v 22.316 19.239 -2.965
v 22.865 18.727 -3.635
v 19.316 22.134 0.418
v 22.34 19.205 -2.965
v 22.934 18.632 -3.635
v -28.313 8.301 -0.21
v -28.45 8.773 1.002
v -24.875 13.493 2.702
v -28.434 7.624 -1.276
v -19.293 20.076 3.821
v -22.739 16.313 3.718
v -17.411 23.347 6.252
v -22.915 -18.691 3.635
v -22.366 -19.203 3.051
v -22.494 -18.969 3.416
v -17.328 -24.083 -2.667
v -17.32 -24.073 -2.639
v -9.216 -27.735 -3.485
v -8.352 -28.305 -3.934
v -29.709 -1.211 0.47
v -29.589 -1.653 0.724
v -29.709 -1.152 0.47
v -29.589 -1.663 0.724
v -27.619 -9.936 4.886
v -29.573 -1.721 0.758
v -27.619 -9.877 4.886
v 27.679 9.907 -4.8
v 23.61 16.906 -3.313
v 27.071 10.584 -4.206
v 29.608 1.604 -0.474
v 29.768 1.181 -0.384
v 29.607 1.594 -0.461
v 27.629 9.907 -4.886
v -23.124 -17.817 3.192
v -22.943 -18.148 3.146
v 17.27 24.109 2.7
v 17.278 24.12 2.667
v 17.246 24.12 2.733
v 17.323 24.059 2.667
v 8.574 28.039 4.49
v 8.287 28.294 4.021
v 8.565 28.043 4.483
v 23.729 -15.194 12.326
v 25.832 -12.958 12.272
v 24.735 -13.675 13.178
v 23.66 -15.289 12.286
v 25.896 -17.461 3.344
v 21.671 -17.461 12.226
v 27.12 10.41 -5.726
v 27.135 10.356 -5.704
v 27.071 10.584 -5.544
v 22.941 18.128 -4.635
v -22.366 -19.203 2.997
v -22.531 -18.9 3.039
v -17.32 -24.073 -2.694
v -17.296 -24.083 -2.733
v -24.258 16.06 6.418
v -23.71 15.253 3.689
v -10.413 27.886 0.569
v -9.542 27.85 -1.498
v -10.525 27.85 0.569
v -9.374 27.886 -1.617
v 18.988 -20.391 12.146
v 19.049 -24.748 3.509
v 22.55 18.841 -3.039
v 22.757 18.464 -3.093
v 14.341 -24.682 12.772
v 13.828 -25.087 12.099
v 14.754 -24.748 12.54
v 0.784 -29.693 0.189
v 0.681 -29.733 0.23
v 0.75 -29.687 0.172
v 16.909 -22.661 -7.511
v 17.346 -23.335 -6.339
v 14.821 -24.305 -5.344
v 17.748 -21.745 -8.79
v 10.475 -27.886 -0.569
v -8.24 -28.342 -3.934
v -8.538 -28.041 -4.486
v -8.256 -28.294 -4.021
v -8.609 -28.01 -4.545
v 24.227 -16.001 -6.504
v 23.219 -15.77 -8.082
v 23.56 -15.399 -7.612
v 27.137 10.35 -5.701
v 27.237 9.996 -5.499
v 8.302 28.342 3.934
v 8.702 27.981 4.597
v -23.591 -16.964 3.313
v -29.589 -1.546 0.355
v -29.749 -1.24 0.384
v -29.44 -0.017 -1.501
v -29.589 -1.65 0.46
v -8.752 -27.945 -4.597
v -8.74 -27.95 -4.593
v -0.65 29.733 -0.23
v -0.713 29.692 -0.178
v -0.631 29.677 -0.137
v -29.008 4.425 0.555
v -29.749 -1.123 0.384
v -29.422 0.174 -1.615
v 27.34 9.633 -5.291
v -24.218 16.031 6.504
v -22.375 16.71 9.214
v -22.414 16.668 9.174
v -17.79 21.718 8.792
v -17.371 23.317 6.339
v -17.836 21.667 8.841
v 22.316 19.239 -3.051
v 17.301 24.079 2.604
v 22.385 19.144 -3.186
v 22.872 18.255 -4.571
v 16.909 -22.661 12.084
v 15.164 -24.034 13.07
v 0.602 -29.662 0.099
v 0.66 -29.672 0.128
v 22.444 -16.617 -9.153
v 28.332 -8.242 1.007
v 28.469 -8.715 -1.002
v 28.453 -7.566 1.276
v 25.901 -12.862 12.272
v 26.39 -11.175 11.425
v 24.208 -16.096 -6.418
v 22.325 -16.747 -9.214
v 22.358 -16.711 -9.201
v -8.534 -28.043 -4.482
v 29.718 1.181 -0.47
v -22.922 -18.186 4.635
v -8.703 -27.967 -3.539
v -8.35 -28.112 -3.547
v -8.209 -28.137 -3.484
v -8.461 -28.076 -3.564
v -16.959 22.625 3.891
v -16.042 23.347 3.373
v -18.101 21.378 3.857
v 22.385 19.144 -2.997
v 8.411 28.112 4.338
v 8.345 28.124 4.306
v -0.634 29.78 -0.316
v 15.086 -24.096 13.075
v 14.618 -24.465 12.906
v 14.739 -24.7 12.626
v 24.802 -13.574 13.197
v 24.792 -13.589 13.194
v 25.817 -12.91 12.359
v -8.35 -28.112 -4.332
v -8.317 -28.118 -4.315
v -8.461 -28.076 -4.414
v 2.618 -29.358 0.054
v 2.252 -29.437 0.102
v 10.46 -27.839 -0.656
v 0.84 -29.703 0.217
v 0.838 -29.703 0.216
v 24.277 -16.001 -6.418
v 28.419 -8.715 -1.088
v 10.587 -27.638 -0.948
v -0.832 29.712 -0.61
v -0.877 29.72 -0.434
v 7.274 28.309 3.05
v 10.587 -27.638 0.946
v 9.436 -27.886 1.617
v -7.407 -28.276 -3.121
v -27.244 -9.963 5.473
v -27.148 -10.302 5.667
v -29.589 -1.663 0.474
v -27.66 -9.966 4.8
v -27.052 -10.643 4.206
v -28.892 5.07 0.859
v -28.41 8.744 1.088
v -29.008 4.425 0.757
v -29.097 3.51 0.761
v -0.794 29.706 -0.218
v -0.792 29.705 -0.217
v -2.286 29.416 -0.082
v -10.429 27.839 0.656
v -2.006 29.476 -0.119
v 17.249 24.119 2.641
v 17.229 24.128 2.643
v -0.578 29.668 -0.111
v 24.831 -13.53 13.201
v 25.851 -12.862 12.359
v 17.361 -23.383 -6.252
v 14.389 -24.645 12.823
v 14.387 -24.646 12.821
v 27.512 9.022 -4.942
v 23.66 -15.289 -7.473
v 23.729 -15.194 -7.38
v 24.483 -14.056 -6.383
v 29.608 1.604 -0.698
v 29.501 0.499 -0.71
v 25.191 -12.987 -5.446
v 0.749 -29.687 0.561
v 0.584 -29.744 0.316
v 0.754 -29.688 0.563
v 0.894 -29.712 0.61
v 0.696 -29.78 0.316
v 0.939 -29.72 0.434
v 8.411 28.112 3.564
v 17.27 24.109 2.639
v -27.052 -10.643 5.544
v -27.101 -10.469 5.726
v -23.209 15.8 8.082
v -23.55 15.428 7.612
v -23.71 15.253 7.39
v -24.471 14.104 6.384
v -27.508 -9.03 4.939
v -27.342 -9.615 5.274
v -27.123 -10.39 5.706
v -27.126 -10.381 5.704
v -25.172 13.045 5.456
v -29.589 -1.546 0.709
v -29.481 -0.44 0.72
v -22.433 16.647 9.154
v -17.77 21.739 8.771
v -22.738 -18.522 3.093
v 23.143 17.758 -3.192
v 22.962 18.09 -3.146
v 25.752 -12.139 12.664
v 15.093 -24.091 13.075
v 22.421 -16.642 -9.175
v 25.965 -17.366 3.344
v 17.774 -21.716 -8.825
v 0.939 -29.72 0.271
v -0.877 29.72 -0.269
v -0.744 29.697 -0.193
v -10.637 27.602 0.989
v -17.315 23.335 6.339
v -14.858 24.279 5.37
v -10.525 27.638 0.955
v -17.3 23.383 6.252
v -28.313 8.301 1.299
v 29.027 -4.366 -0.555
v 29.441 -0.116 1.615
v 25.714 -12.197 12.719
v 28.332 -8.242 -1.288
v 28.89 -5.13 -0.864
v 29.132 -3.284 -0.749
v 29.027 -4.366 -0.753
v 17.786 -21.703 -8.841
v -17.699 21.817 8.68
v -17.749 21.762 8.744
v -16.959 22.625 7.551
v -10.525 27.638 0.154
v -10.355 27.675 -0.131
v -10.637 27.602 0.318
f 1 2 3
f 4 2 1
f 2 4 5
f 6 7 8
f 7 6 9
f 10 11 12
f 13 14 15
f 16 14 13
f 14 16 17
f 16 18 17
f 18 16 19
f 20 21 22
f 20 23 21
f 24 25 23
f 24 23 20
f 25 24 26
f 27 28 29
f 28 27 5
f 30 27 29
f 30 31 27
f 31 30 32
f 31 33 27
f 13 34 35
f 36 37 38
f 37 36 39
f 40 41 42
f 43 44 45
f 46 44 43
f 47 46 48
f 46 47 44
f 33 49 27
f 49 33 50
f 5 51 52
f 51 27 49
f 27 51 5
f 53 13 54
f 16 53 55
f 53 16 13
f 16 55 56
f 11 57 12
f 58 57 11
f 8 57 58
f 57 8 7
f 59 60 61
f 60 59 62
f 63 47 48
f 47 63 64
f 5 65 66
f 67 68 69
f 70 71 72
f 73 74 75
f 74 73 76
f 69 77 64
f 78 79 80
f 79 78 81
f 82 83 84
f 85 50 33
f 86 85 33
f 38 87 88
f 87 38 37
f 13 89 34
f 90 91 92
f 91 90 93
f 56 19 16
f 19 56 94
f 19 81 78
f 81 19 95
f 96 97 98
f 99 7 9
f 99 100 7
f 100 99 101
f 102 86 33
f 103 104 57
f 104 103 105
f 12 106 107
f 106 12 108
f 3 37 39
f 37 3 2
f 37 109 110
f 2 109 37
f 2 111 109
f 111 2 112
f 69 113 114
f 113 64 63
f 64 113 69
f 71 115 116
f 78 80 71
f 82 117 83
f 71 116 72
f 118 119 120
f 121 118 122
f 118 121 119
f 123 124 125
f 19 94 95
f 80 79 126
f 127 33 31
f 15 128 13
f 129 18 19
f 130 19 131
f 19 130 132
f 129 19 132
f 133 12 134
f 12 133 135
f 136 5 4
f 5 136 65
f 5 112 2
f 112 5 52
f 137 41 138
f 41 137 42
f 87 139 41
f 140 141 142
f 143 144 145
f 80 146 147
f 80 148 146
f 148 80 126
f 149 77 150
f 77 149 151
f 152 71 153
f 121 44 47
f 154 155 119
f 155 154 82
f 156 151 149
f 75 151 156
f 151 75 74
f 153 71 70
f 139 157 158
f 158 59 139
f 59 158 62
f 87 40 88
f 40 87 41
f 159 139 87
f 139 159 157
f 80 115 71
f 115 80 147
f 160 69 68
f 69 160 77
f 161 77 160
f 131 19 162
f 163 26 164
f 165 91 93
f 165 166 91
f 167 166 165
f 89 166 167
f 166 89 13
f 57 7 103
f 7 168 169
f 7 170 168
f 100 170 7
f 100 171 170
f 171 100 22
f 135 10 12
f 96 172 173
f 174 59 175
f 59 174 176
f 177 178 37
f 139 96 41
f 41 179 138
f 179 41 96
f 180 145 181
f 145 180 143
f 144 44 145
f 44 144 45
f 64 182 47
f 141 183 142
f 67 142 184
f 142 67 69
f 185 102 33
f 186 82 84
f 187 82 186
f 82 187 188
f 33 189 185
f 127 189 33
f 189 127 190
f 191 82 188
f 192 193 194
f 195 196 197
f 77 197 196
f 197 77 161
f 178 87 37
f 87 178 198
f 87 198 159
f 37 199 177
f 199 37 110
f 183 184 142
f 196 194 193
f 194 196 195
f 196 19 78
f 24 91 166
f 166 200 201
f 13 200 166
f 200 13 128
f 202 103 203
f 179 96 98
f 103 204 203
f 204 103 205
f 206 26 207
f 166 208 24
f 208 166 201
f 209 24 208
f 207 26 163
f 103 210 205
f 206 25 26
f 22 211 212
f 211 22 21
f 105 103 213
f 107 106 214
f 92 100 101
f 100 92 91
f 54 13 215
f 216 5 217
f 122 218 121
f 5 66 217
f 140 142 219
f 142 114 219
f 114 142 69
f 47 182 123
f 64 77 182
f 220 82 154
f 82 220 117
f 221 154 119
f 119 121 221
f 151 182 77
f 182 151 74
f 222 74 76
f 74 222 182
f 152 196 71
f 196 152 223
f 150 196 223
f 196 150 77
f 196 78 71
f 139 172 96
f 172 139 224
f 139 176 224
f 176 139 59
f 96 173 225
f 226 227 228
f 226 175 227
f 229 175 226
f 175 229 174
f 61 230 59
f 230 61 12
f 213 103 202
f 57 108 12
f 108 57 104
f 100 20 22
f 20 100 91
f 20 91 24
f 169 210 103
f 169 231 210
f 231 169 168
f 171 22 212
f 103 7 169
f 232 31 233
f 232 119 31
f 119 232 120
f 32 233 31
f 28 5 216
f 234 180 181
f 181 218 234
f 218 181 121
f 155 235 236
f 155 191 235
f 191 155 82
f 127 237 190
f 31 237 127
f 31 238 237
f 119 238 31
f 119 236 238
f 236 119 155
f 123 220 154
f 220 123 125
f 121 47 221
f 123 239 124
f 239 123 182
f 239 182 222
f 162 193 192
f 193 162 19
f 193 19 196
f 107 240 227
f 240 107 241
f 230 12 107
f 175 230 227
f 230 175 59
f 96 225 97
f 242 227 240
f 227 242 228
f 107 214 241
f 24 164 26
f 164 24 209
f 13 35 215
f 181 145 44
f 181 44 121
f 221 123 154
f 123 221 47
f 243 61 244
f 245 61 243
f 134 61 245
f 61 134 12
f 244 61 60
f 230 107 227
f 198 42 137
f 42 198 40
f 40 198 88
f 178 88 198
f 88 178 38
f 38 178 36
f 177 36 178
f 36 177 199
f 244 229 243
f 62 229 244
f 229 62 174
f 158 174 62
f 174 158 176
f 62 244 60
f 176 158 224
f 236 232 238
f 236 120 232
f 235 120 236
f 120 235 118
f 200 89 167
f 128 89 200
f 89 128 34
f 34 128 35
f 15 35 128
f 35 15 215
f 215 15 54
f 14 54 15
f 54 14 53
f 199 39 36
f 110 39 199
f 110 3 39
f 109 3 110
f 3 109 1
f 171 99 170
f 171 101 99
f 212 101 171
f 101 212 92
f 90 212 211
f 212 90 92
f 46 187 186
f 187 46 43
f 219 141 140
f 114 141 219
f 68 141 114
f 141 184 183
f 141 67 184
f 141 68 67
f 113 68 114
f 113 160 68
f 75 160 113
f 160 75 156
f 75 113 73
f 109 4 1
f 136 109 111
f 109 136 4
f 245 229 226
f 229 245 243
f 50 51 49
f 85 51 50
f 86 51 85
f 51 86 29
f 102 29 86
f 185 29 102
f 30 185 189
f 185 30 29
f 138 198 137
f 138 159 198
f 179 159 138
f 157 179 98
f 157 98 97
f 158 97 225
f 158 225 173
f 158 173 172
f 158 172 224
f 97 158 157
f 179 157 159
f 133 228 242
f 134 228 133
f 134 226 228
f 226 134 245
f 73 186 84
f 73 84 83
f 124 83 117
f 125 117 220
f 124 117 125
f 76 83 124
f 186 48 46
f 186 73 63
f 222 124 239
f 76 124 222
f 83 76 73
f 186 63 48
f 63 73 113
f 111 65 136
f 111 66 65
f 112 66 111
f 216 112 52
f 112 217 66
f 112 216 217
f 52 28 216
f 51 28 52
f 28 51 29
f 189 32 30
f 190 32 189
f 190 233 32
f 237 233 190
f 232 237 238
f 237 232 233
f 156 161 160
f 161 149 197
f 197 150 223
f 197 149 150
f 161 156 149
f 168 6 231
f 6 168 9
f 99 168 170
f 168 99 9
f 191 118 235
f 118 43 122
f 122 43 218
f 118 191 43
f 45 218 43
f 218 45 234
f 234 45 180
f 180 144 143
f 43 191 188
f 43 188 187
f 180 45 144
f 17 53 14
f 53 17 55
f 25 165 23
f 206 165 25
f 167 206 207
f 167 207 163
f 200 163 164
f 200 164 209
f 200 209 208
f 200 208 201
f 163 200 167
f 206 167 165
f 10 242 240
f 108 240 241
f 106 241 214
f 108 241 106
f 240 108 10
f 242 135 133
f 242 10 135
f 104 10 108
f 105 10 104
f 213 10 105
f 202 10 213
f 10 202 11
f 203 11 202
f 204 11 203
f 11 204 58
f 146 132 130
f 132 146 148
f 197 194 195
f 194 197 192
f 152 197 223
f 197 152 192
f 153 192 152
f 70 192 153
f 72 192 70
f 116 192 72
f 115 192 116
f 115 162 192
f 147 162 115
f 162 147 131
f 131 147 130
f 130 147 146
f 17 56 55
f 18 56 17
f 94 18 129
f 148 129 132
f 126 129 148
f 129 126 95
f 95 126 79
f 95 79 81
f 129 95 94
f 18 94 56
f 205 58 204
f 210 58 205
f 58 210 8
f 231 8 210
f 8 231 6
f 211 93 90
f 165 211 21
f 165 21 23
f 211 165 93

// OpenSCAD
// Auto-generated OpenSCAD file

    inner_points = 10*[[0.2788714861850696, -1.0304896461318445, -2.7709112654901276], [0.685907632903912, 1.238698593681754, 2.610131025628235], [-0.685907632903912, -1.238698593681754, -2.610131025628235], [-0.2788714861850696, 1.0304896461318445, 2.7709112654901276], [-0.7773759281468879, 2.434668491612277, -1.51185431179736], [-0.7078458534974362, 2.8222921190953687, -0.5926625515339796], [0.7078458534974362, -2.8222921190953687, 0.5926625515339796], [0.7773759281468879, -2.434668491612277, 1.51185431179736], [2.697104584625795, 1.0584362440316053, -0.6503591582524926], [-2.9508107534296504, -0.16044016521109683, 0.2908647600571094], [2.9508107534296504, 0.16044016521109683, -0.2908647600571094], [-2.697104584625795, -1.0584362440316053, 0.6503591582524926], [0.9540270796310585, -0.2932647414592524, -2.7966865359849638], [1.3180912769762223, 1.736358921727268, 2.016264005111785], [-1.5717974457800779, -0.8383628429067593, -2.375758403307168], [-1.2077332484349137, 1.1912608202797608, 2.4371921377895807], [1.2077332484349137, -1.1912608202797608, -2.4371921377895807], [1.5717974457800779, 0.8383628429067593, 2.375758403307168], [-1.3180912769762223, -1.736358921727268, -2.016264005111785], [-0.9540270796310585, 0.2932647414592524, 2.7966865359849638], [-0.27283786287581185, 1.9476828140945452, -2.2247963084458355], [-0.09080576420322983, 2.962494645687806, 0.18167896210253875], [-1.2376169819647935, 1.7394738665446359, -2.0640160685839426], [-1.0555848832922115, 2.754285698137896, 0.34245920196443147], [1.0555848832922115, -2.754285698137896, -0.34245920196443147], [1.2376169819647935, -1.7394738665446359, 2.0640160685839426], [0.09080576420322983, -2.962494645687806, -0.18167896210253875], [0.27283786287581185, -1.9476828140945452, 2.2247963084458355], [2.1589538015444045, 1.5267784157640718, -1.351108289429837], [2.2284838761938564, 1.9144020432471627, -0.4319165291664567], [-2.892695249277868, 0.4365822128690581, -0.5092520240742452], [-2.823165174628416, 0.8242058403521488, 0.40993973618913493], [2.823165174628416, -0.8242058403521488, -0.40993973618913493], [2.892695249277868, -0.4365822128690581, 0.5092520240742452], [-2.2284838761938564, -1.9144020432471627, 0.4319165291664567], [-2.1589538015444045, -1.5267784157640718, 1.351108289429837], [1.0816726584322927, 0.6913812641039931, -2.677611559852939], [1.3762067811280048, 2.3333812998074226, 1.2161472209804305], [-2.0404181542120163, 0.017602956308798157, -2.157315774221132], [-1.7458840315163044, 1.6596029920122275, 1.7364430066122367], [1.7458840315163044, -1.6596029920122275, -1.7364430066122367], [2.0404181542120163, -0.017602956308798157, 2.157315774221132], [-1.3762067811280048, -2.3333812998074226, -1.2161472209804305], [-1.0816726584322927, -0.6913812641039931, 2.677611559852939], [0.6130519500003537, 1.5473470633195512, -2.4591689307669027], [0.8380559980466143, 2.8017234715398893, 0.5153980898030859], [-1.9127725754107823, 1.002248961872044, -2.038240798089107], [-1.6877685273645218, 2.256625370092382, 0.9363262224808817], [1.6877685273645218, -2.256625370092382, -0.9363262224808817], [1.9127725754107823, -1.002248961872044, 2.038240798089107], [-0.8380559980466143, -2.8017234715398893, -0.5153980898030859], [-0.6130519500003537, -1.5473470633195512, 2.4591689307669027], [1.5419137122501982, 1.3865758891716347, -2.1254498030663553], [1.72394581092278, 2.4013877207648946, 0.28102546748201884], [-2.544956219483093, 0.50458863382653, -1.4443737775726566], [-2.362924120810511, 1.5194004654197903, 0.9621014929757177], [2.362924120810511, -1.5194004654197903, -0.9621014929757177], [2.544956219483093, -0.50458863382653, 1.4443737775726566], [-1.72394581092278, -2.4013877207648946, -0.28102546748201884], [-1.5419137122501982, -1.3865758891716347, 2.1254498030663553], [2.3082876055504564, 0.7615081838539526, -1.9772559454450247], [2.7187928098306124, -0.69147999344176, -1.3955817903997059], [1.8480465517325515, 0.06631355878631129, -2.5294177022316076], [2.101752720536407, -0.8316825200341973, -2.1699233040362245], [2.8464383886318467, 0.29316601212148596, -1.2765068142676803]];

    outer_points = 10*[[0.06653641711366541, -2.9685347860851214, 0.03164785636256174], [0.8271195003044141, 2.824663490765131, 0.3934170229754035], [-0.8271195003044141, -2.824663490765131, -0.3934170229754035], [-0.06653641711366541, 2.9685347860851214, -0.03164785636256174], [1.192305111883895, -0.49479820391320845, -2.6741747727835405], [1.3222282132537881, 0.49479820391320845, -2.612377221477033], [-1.3222282132537881, -0.49479820391320845, 2.612377221477033], [-1.192305111883895, 0.49479820391320845, 2.6741747727835405], [2.8305432173739673, -0.4211186164098232, 0.792661127660119], [-2.4010096459338772, 0.4211186164098232, -1.6957120182559484], [2.4010096459338772, -0.4211186164098232, 1.6957120182559484], [-2.8305432173739673, 0.4211186164098232, -0.792661127660119], [1.0444344734338675, -2.7791270014109664, -0.056896384274534084], [1.724720664054224, 2.4024670602577576, 0.26667979520937046], [-1.2951870926141336, -2.4024670602577576, -1.1697306858052], [-0.614900901993777, 2.7791270014109664, -0.8461545063212954], [0.614900901993777, -2.7791270014109664, 0.8461545063212954], [1.2951870926141336, 2.4024670602577576, 1.1697306858052], [-1.724720664054224, -2.4024670602577576, -0.26667979520937046], [-1.0444344734338675, 2.7791270014109664, 0.056896384274534084], [1.4012899003932389, -1.3673341630771763, -2.232579530352738], [1.7414329957034171, 1.2234628677571857, -2.070791440610786], [0.5076339829751594, -1.2234628677571857, -2.657644409690703], [0.8477770782853377, 1.3673341630771763, -2.495856319948751], [-0.8477770782853377, -1.3673341630771763, 2.495856319948751], [-0.5076339829751594, 1.2234628677571857, 2.657644409690703], [-1.7414329957034171, -1.2234628677571857, 2.070791440610786], [-1.4012899003932389, 1.3673341630771763, 2.232579530352738], [2.836926760032699, -0.8714581450664176, -0.10017343669796008], [2.9668498614025918, 0.11813826275999922, -0.03837588539145265], [-1.8423163720633038, -0.11813826275999922, -2.3258420397592916], [-1.7123932706934106, 0.8714581450664176, -2.264044488452784], [1.7123932706934106, -0.8714581450664176, 2.264044488452784], [1.8423163720633038, 0.11813826275999922, 2.3258420397592916], [-2.9668498614025918, -0.11813826275999922, 0.03837588539145265], [-2.836926760032699, 0.8714581450664176, 0.10017343669796008], [1.733050848674334, -2.3287874727543723, -0.6252288544713702], [2.2834139379247977, 1.863210181087935, -0.36345022629397317], [-1.1588804485855093, -1.863210181087935, -2.0007676988567713], [-0.6085173593350457, 2.3287874727543723, -1.7389890706793742], [0.6085173593350457, -2.3287874727543723, 1.7389890706793742], [1.1588804485855093, 1.863210181087935, 2.0007676988567713], [-2.2834139379247977, -1.863210181087935, 0.36345022629397317], [-1.733050848674334, 2.3287874727543723, 0.6252288544713702], [1.8693574927029581, -1.7895305935845496, -1.4562658675229414], [2.2897974805835286, 1.4128706524313404, -1.2562847906520518], [-0.47026407334504305, -1.4128706524313404, -2.5691001690536073], [-0.04982408546447248, 1.7895305935845496, -2.369119092182718], [0.04982408546447248, -1.7895305935845496, 2.369119092182718], [0.47026407334504305, 1.4128706524313404, 2.5691001690536073], [-2.2897974805835286, -1.4128706524313404, 1.2562847906520518], [-1.8693574927029581, 1.7895305935845496, 1.4562658675229414], [2.41772197758307, -1.600122808910395, -0.6417592175642077], [2.757865072893248, 0.990674221923967, -0.4799711278222555], [-1.3678652370948527, -0.990674221923967, -2.4423629412875743], [-1.027722141784675, 1.600122808910395, -2.280574851545622], [1.027722141784675, -1.600122808910395, 2.280574851545622], [1.3678652370948527, 0.990674221923967, 2.4423629412875743], [-2.757865072893248, -0.990674221923967, 0.4799711278222555], [-2.41772197758307, 1.600122808910395, 0.6417592175642077], [2.586519131581444, -1.7365837684676733, 0.3343995437644788], [1.8915192136822463, -1.7365837684676733, 1.7955665783193937], [1.9018480026727085, -2.4652484323116504, 0.3509299068573166], [1.472314431232618, -2.4652484323116504, 1.253980797453146], [2.5801355889227136, -1.2862442398110787, 1.227234108122558]];

    // Convex hull for inner set (I)
    module inner_hull() {
        hull() {
            for (p = inner_points) {
                translate(p) sphere(r=0.1);
            }
        }
    }

    // Convex hull for outer set (O) minus inner hull (O \ I)
    module outer_minus_inner() {
        difference() {
            hull() {
                for (p = outer_points) {
                    translate(p) sphere(r=0.1);
                }
            }
            inner_hull(); // Subtract inner hull
        }
    }

    // Convex hull for outer set (O) minus all translated inner hulls
    module outer_minus_AllTranslationInner() {
        difference() {
            hull() {
                for (p = outer_points) {
                    translate(p) sphere(r=0.1);
                }
            }
            hull() {
                translate([0,0,50]) inner_hull();
                translate([0,0,-50]) inner_hull();
            }; // Subtract translated inner hulls
        }
    }

    // Difference between outer_minus_inner and outer_minus_AllTranslationInner
    module outer_minus_inner_diff() {
        difference() {
            // Outer minus inner
            difference() {
                hull() {
                    for (p = outer_points) {
                        translate(p) sphere(r=0.1);
                    }
                }
                inner_hull();
            }

            // Subtract Outer minus AllTranslationInner
            difference() {
                hull() {
                    for (p = outer_points) {
                        translate(p) sphere(r=0.1);
                    }
                }
                hull() {
                    translate([0,0,50]) inner_hull();
                    translate([0,0,-50]) inner_hull();
                };
            }
        }
    }

    // Rendering all with colors applied
    color([0, 1, 0, 1]) outer_minus_AllTranslationInner(); // Opaque green
    
